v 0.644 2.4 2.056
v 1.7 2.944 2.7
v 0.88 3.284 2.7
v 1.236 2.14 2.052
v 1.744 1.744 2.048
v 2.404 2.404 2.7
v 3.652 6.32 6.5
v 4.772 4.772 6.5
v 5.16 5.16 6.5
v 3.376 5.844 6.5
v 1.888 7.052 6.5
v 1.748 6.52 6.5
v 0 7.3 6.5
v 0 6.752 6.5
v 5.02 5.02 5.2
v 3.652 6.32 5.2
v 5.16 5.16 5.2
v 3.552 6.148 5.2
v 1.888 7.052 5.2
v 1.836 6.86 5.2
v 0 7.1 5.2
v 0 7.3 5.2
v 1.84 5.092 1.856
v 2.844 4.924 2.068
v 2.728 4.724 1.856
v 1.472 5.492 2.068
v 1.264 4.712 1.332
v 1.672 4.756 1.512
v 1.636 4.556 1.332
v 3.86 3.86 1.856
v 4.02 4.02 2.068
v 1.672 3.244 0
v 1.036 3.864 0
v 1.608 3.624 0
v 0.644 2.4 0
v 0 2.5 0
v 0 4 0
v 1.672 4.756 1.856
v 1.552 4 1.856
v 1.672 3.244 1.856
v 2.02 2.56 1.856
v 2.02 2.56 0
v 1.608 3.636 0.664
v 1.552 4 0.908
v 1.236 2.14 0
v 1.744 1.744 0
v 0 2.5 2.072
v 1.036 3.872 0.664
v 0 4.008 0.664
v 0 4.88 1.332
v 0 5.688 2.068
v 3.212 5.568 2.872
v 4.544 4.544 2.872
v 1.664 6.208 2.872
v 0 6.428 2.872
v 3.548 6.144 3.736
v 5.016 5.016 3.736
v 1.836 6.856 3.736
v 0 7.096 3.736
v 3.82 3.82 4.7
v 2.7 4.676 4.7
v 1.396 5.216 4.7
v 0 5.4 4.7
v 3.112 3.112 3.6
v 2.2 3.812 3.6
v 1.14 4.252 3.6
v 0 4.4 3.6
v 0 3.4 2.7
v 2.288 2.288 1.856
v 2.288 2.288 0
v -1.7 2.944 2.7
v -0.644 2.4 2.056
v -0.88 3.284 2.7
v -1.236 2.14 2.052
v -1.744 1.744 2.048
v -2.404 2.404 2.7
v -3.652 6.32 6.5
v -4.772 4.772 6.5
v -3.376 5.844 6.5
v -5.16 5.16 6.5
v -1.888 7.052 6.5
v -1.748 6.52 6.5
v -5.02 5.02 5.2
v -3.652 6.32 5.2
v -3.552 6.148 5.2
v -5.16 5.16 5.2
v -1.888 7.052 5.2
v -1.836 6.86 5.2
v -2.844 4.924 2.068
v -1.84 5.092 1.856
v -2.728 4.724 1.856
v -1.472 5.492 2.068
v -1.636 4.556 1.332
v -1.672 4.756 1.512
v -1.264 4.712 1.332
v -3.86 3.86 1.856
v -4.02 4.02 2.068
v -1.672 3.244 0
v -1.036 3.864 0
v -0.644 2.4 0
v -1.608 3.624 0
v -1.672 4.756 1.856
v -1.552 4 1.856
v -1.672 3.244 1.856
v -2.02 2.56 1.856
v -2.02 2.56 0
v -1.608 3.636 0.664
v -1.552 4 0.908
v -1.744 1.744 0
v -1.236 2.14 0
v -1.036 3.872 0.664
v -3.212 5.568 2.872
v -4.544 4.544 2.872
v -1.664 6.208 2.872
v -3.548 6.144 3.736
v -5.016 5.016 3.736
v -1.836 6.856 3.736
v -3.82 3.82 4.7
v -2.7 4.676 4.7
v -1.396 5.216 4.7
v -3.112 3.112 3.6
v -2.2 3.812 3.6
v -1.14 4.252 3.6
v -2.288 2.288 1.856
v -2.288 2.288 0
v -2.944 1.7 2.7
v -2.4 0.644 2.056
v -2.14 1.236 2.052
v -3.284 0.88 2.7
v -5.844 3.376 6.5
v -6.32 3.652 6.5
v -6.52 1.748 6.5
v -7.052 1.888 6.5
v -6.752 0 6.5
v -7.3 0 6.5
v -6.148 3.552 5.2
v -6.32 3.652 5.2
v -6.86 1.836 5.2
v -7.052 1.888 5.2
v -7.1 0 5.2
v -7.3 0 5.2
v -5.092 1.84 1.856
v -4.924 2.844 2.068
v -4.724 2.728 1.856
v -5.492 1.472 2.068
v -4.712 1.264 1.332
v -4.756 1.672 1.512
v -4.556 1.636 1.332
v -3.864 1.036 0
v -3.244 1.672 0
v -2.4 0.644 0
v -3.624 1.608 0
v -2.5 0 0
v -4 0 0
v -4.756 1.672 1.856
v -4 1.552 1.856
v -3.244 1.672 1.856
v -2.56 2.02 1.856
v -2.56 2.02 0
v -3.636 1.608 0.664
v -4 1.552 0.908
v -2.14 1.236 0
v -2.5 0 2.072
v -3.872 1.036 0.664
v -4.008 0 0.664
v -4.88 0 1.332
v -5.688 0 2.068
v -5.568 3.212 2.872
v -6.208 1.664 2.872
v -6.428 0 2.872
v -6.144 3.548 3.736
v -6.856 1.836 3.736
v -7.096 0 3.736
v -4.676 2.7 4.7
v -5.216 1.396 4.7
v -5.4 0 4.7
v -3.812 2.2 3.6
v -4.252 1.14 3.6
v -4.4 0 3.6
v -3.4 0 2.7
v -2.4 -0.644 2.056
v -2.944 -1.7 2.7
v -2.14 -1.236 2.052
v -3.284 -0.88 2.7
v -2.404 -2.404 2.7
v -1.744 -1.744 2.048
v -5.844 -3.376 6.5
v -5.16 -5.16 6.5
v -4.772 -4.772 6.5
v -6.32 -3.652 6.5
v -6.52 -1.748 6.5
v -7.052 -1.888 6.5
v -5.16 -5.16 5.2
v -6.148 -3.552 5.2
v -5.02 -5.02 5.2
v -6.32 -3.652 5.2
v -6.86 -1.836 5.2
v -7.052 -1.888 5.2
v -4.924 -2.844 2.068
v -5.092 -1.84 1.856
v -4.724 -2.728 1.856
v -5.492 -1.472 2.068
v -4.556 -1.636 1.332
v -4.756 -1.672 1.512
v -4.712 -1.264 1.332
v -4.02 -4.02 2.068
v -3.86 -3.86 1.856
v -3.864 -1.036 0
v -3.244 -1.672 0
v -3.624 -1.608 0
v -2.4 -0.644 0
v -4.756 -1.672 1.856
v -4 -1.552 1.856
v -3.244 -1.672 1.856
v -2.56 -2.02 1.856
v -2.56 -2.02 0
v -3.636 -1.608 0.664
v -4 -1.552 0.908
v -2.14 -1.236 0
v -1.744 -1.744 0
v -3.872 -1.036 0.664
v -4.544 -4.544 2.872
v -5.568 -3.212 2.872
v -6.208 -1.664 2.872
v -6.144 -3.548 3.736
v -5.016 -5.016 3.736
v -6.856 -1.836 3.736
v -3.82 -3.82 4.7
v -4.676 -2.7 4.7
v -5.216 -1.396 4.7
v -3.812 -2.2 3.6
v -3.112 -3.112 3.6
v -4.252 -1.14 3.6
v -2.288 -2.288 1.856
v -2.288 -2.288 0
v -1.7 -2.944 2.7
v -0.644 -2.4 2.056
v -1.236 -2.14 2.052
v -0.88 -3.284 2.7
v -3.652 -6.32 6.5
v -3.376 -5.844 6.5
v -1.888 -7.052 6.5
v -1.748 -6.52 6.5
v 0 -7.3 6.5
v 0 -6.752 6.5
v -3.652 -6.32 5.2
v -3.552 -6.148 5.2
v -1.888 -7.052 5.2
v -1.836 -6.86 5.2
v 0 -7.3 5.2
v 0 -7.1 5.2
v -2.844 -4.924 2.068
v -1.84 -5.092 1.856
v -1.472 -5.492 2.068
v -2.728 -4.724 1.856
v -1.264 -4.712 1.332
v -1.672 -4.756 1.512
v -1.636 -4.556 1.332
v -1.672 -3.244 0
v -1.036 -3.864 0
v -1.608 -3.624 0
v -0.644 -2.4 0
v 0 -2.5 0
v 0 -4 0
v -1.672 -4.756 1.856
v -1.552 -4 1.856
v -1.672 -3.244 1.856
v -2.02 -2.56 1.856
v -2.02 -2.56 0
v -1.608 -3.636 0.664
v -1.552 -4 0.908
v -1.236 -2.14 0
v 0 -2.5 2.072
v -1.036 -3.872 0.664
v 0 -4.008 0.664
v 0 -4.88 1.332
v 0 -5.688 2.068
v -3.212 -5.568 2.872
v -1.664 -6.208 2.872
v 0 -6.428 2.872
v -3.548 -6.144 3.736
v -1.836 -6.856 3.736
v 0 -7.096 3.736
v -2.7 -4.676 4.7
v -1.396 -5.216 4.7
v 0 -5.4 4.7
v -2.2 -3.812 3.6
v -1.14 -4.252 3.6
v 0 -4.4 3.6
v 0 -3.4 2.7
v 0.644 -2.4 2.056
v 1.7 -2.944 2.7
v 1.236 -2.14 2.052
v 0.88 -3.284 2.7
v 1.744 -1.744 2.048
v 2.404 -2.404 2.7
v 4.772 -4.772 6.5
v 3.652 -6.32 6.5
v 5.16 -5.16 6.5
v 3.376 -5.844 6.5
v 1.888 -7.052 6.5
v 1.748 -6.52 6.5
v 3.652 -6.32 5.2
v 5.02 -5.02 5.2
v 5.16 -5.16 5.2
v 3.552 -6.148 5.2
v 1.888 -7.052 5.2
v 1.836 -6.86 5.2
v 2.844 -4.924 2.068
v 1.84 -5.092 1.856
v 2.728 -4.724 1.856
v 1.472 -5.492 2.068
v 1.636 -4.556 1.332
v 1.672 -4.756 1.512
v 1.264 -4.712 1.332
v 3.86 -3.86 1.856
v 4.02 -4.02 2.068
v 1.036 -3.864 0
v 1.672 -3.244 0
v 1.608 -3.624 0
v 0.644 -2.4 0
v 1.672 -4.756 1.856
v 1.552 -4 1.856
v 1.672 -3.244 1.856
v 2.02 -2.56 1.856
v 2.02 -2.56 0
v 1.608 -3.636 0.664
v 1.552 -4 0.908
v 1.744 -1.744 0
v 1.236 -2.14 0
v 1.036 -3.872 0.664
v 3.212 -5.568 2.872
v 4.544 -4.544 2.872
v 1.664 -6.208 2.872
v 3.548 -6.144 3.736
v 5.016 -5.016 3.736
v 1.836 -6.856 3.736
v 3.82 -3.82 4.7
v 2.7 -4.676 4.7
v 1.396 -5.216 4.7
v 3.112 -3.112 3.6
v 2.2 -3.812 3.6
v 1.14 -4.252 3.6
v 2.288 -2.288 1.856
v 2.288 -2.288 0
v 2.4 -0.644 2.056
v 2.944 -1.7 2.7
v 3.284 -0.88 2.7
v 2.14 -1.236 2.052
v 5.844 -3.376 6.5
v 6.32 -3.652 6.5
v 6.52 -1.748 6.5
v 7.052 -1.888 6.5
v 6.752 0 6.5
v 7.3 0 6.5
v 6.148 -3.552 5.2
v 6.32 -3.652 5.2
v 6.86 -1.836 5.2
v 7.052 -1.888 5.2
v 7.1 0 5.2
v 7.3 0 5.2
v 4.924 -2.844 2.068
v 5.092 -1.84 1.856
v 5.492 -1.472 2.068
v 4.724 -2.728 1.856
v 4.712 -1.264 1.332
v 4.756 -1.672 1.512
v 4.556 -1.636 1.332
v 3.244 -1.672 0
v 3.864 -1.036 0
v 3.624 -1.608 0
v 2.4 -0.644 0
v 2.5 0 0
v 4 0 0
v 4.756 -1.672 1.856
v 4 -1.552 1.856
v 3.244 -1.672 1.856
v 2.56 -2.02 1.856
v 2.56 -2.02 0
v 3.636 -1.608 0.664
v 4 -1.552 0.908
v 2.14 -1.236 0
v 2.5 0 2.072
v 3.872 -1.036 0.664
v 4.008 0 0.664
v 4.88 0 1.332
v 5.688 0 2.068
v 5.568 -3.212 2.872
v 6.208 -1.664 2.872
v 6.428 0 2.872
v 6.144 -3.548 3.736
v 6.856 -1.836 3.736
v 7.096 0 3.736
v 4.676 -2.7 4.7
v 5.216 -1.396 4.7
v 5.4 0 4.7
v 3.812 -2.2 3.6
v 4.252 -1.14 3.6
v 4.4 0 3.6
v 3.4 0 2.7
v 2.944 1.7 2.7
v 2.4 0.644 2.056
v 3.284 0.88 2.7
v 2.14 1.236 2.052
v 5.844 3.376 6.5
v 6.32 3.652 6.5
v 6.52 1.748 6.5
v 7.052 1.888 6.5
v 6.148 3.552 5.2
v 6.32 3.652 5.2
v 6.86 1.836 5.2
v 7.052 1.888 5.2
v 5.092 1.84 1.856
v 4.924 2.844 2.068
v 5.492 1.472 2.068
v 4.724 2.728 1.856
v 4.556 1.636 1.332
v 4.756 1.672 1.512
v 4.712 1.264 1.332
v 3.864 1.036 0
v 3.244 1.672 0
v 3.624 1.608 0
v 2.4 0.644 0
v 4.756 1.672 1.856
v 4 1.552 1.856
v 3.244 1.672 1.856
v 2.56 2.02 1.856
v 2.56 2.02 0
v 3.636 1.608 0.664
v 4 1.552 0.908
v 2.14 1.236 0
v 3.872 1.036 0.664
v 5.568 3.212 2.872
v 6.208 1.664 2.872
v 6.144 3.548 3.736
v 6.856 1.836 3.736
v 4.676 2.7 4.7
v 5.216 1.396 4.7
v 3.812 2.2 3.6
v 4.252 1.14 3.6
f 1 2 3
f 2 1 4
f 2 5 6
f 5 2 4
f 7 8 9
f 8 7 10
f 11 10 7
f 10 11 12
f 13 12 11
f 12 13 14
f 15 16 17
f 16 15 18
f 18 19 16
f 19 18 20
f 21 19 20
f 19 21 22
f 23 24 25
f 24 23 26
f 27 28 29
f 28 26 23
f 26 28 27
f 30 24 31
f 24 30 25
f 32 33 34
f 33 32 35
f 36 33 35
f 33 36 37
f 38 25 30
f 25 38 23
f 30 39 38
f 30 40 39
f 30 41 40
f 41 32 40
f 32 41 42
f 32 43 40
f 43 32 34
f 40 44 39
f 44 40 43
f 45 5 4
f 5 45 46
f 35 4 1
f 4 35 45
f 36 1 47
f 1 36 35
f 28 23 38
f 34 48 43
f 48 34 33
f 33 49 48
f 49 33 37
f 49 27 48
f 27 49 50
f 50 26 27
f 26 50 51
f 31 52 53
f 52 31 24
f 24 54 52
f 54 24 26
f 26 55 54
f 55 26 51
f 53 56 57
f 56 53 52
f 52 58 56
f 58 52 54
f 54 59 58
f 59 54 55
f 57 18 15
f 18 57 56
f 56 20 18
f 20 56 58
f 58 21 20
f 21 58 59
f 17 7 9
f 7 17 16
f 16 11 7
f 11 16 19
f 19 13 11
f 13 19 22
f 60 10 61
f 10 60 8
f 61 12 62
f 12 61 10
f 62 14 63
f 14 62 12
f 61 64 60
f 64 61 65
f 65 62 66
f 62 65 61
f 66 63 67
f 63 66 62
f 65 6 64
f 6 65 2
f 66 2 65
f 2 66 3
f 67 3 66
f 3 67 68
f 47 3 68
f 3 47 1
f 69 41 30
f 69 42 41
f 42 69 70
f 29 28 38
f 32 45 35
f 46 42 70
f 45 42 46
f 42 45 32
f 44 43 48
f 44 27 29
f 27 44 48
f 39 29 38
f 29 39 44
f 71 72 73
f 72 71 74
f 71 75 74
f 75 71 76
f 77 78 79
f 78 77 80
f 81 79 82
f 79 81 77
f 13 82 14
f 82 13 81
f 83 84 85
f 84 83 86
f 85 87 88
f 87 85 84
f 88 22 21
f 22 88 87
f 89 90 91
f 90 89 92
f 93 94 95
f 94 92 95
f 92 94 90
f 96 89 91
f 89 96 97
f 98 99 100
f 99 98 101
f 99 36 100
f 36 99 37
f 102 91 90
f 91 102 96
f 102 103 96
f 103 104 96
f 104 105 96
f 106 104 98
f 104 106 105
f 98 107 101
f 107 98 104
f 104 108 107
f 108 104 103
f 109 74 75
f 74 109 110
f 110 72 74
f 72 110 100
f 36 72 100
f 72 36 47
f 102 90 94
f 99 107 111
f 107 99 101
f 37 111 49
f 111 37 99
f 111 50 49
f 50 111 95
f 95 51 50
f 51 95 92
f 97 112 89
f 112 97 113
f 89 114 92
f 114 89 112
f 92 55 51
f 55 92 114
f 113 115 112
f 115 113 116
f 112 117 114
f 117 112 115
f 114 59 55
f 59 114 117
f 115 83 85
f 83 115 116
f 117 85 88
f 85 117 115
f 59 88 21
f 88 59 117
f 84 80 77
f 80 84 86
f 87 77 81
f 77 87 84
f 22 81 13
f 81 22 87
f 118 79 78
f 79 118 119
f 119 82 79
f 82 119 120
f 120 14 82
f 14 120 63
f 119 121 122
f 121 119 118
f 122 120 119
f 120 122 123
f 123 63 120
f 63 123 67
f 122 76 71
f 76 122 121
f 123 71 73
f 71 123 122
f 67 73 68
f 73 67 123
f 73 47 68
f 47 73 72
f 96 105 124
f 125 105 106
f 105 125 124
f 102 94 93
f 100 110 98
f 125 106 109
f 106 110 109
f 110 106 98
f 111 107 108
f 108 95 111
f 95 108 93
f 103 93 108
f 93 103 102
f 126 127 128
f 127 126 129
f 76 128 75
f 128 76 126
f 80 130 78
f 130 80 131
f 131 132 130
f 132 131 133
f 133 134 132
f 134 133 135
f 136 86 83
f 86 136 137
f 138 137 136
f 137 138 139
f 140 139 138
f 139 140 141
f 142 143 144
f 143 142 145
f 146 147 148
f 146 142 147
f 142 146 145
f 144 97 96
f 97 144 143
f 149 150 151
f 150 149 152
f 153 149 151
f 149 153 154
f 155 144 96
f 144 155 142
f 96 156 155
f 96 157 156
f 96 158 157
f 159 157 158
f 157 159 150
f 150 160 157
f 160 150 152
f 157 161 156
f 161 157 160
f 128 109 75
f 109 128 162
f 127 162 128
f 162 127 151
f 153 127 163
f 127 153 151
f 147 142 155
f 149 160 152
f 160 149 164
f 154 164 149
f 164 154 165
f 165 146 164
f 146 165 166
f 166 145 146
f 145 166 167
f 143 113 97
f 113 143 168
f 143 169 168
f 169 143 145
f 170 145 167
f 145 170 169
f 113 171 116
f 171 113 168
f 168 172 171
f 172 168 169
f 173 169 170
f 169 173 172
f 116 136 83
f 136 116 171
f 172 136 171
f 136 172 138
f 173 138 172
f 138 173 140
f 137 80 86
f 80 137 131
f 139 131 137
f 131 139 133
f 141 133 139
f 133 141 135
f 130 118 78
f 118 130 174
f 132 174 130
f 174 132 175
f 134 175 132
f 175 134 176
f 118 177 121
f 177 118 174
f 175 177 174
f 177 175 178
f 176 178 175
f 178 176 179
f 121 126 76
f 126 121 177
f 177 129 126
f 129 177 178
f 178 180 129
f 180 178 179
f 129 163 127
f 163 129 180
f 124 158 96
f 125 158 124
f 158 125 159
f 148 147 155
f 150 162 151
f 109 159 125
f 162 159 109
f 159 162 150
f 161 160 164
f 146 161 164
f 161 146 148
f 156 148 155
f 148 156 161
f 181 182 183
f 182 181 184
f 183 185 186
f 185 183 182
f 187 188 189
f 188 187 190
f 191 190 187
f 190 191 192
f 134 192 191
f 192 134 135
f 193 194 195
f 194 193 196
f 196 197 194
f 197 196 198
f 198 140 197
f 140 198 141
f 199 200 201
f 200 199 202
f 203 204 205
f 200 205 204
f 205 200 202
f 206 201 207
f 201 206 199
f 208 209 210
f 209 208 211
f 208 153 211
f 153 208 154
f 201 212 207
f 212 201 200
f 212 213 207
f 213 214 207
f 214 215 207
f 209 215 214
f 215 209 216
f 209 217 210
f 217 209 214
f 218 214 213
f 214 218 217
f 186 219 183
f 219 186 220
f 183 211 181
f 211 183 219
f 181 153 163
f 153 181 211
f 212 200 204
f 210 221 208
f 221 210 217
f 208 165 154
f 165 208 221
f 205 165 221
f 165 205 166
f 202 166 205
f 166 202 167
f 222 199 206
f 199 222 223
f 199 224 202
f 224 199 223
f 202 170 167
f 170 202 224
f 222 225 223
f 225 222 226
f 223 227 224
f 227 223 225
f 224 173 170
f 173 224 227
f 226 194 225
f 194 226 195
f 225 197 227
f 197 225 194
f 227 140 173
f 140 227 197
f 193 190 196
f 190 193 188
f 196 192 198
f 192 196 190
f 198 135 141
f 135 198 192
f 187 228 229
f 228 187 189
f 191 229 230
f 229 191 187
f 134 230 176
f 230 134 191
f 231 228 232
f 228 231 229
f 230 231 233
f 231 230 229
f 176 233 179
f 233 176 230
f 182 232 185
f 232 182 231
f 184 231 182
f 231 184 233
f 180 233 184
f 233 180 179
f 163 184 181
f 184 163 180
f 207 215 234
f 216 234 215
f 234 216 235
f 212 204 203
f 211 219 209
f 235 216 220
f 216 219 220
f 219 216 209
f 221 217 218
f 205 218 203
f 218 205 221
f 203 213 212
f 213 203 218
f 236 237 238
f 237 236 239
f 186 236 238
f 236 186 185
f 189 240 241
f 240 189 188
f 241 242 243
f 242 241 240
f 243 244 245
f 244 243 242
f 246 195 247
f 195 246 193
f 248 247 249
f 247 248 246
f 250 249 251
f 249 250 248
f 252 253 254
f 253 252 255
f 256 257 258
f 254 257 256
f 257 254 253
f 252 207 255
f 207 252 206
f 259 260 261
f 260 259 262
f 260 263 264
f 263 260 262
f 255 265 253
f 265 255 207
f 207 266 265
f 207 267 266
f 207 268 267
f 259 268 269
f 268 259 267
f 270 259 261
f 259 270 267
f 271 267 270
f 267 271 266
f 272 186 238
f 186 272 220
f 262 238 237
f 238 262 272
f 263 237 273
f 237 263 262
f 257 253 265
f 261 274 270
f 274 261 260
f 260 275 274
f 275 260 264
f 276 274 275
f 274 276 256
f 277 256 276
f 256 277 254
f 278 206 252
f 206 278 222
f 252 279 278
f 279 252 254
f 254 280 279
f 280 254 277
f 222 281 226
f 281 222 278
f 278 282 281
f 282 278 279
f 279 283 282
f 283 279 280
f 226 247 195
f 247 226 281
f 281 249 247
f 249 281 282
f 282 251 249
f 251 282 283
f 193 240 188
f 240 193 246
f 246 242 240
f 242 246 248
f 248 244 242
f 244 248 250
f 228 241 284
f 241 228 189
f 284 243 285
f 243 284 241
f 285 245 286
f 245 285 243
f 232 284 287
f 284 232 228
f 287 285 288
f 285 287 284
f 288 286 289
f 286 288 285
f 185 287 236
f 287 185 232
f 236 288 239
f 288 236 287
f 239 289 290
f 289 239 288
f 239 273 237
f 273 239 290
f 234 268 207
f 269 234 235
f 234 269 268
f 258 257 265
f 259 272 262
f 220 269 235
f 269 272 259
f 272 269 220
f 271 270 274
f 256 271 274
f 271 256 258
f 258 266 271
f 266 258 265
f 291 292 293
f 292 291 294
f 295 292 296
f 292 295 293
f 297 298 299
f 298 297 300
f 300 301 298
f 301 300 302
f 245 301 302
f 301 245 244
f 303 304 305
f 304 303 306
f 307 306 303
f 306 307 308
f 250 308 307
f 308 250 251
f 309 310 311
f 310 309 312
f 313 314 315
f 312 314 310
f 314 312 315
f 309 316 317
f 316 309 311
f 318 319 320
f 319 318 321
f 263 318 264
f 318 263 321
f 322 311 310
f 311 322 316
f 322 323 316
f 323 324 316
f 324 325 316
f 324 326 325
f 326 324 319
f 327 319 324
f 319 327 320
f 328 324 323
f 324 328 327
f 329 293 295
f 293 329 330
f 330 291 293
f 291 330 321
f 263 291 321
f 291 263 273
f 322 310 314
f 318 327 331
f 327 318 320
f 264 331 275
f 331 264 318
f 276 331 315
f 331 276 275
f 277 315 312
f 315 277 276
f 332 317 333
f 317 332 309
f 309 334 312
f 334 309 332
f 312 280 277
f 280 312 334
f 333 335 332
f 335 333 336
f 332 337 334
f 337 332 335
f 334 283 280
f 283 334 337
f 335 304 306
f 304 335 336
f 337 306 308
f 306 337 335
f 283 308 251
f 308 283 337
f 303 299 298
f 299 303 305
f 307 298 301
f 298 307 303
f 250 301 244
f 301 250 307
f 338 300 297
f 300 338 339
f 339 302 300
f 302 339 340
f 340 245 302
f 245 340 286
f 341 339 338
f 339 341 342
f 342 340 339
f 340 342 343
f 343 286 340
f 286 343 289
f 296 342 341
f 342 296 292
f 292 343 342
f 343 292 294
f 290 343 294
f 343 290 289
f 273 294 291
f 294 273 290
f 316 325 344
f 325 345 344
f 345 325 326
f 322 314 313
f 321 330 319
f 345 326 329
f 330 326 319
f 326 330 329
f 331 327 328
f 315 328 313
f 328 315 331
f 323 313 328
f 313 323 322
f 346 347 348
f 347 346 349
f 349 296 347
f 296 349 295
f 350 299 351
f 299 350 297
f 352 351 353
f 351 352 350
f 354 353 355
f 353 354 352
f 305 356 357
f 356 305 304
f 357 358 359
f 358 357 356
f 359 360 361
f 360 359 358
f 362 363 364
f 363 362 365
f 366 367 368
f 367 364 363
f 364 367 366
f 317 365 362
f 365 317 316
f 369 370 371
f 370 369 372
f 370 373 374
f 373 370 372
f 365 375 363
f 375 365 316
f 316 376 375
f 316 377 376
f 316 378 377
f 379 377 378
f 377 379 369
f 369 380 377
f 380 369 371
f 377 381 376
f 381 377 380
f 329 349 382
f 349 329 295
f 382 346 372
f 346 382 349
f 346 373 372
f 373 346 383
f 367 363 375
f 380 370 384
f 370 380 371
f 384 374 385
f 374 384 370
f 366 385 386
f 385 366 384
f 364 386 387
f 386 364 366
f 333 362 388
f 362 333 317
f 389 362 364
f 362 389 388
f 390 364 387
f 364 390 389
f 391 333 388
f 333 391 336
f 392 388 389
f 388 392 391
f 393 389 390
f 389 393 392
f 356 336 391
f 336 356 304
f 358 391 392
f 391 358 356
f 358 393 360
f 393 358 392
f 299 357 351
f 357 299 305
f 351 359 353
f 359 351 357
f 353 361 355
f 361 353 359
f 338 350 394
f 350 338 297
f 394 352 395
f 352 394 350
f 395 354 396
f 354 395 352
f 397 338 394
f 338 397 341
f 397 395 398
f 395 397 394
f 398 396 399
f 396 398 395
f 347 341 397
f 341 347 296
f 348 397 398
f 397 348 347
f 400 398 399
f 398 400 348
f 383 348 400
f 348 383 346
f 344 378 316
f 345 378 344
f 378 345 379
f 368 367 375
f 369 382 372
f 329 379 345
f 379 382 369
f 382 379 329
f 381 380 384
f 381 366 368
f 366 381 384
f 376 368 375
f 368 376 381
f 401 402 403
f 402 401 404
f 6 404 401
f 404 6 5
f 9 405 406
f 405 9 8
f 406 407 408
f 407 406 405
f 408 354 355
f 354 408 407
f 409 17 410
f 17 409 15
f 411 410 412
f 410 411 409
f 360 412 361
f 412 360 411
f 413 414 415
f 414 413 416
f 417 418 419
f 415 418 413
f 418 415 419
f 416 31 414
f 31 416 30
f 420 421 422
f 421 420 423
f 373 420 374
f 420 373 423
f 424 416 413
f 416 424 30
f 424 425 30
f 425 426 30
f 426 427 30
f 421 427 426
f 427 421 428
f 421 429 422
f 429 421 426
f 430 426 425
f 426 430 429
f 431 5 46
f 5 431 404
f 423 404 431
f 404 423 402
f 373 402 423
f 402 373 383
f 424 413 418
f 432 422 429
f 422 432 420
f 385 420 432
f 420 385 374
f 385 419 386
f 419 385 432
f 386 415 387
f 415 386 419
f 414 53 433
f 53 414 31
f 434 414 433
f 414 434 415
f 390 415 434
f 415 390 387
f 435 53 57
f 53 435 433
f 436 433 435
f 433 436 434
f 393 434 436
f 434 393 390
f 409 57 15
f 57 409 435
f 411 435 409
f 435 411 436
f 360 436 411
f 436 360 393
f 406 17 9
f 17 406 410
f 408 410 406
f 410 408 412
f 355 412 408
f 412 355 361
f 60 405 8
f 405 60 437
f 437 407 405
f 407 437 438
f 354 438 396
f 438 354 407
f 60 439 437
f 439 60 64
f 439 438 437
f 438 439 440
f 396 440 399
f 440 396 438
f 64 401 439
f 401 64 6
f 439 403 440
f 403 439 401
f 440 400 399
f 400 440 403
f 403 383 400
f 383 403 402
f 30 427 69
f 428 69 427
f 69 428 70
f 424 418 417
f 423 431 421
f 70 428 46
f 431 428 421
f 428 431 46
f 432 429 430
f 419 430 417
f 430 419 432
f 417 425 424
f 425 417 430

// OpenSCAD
// file: 902.scad
use <../lib.scad>
use <s/902s01.scad>
function ldraw_lib__902() = [
// 0 Electric Light Reflector Round  2 x  2 x  0.667
// 0 Name: 902.dat
// 0 Author: Andy Westrate [westrate]
// 0 !LDRAW_ORG Part UPDATE 2012-01
// 0 !LICENSE Licensed under CC BY 4.0 : see CAreadme.txt
// 
// 0 BFC CERTIFY CCW
  [0,"BFC","CERTIFY"],
  [0,"BFC","CCW"],
// 
// 0 !CATEGORY Dish
// 0 !KEYWORDS BrickLink x85, Rebrickable 71128
// 
// 0 !HISTORY 2007-08-25 {LEGO Universe Team} Original part shape
// 0 !HISTORY 2009-05-06 [westrate] File preparation for LDraw Parts Tracker
// 0 !HISTORY 2012-03-30 [PTadmin] Official Update 2012-01
// 
// 
// 1 16 0 0 0 1 0 0 0 1 0 0 0 1 s\902s01.dat
  [1,16,0,0,0,1,0,0,0,1,0,0,0,1, ldraw_lib__s__902s01()],
// 1 16 0 0 0 -1 0 0 0 1 0 0 0 1 s\902s01.dat
  [1,16,0,0,0,-1,0,0,0,1,0,0,0,1, ldraw_lib__s__902s01()],
// 1 16 0 0 0 0 0 -1 0 1 0 1 0 0 s\902s01.dat
  [1,16,0,0,0,0,0,-1,0,1,0,1,0,0, ldraw_lib__s__902s01()],
// 1 16 0 0 0 0 0 -1 0 1 0 -1 0 0 s\902s01.dat
  [1,16,0,0,0,0,0,-1,0,1,0,-1,0,0, ldraw_lib__s__902s01()],
// 1 16 0 0 0 -1 0 0 0 1 0 0 0 -1 s\902s01.dat
  [1,16,0,0,0,-1,0,0,0,1,0,0,0,-1, ldraw_lib__s__902s01()],
// 1 16 0 0 0 1 0 0 0 1 0 0 0 -1 s\902s01.dat
  [1,16,0,0,0,1,0,0,0,1,0,0,0,-1, ldraw_lib__s__902s01()],
// 1 16 0 0 0 0 0 1 0 1 0 -1 0 0 s\902s01.dat
  [1,16,0,0,0,0,0,1,0,1,0,-1,0,0, ldraw_lib__s__902s01()],
// 1 16 0 0 0 0 0 1 0 1 0 1 0 0 s\902s01.dat
  [1,16,0,0,0,0,0,1,0,1,0,1,0,0, ldraw_lib__s__902s01()],
// 0
];
module ldraw_lib__902(step=0, col=false, unit=2/5, alt=false, line=0.2, solid=!$preview)
    makepoly(ldraw_lib__902(), step=step, col=col, unit=unit, alt=alt, line=line, solid=solid);
ldraw_lib__902(line=0.2);
// main file
use <../lib.scad>
use <902.scad>
function ldraw_lib__71128() = [
// 0 ~_Electric Light Reflector Round  2 x  2 x  0.667 Chrome Silver (Obsolete)
// 0 Name: 71128.dat
// 0 Author: [PTadmin]
// 0 !LDRAW_ORG Part Physical_Colour UPDATE 2019-02
// 0 !LICENSE Licensed under CC BY 4.0 : see CAreadme.txt
// 
// 0 BFC CERTIFY CCW
  [0,"BFC","CERTIFY"],
  [0,"BFC","CCW"],
// 
// 0 !CATEGORY Obsolete
// 
// 0 !HISTORY 2012-03-30 [PTadmin] Official Update 2012-01
// 0 !HISTORY 2019-08-31 [Holly-Wood] Obsoleted per decision not to include physical colour parts
// 0 !HISTORY 2019-09-09 [PTadmin] Official Update 2019-02
// 
// 
// 0 // This file is a "shortcut" with the correct number for the actual
// 0 // colouring of the part (Chrome Silver).
// 
// 1 383 0 0 0 1 0 0 0 1 0 0 0 1 902.dat
  [1,383,0,0,0,1,0,0,0,1,0,0,0,1, ldraw_lib__902()],
];
module ldraw_lib__71128(step=0, col=false, unit=2/5, alt=false, line=0.2, solid=!$preview)
    makepoly(ldraw_lib__71128(), step=step, col=col, unit=unit, alt=alt, line=line, solid=solid);
ldraw_lib__71128(line=0.2);
